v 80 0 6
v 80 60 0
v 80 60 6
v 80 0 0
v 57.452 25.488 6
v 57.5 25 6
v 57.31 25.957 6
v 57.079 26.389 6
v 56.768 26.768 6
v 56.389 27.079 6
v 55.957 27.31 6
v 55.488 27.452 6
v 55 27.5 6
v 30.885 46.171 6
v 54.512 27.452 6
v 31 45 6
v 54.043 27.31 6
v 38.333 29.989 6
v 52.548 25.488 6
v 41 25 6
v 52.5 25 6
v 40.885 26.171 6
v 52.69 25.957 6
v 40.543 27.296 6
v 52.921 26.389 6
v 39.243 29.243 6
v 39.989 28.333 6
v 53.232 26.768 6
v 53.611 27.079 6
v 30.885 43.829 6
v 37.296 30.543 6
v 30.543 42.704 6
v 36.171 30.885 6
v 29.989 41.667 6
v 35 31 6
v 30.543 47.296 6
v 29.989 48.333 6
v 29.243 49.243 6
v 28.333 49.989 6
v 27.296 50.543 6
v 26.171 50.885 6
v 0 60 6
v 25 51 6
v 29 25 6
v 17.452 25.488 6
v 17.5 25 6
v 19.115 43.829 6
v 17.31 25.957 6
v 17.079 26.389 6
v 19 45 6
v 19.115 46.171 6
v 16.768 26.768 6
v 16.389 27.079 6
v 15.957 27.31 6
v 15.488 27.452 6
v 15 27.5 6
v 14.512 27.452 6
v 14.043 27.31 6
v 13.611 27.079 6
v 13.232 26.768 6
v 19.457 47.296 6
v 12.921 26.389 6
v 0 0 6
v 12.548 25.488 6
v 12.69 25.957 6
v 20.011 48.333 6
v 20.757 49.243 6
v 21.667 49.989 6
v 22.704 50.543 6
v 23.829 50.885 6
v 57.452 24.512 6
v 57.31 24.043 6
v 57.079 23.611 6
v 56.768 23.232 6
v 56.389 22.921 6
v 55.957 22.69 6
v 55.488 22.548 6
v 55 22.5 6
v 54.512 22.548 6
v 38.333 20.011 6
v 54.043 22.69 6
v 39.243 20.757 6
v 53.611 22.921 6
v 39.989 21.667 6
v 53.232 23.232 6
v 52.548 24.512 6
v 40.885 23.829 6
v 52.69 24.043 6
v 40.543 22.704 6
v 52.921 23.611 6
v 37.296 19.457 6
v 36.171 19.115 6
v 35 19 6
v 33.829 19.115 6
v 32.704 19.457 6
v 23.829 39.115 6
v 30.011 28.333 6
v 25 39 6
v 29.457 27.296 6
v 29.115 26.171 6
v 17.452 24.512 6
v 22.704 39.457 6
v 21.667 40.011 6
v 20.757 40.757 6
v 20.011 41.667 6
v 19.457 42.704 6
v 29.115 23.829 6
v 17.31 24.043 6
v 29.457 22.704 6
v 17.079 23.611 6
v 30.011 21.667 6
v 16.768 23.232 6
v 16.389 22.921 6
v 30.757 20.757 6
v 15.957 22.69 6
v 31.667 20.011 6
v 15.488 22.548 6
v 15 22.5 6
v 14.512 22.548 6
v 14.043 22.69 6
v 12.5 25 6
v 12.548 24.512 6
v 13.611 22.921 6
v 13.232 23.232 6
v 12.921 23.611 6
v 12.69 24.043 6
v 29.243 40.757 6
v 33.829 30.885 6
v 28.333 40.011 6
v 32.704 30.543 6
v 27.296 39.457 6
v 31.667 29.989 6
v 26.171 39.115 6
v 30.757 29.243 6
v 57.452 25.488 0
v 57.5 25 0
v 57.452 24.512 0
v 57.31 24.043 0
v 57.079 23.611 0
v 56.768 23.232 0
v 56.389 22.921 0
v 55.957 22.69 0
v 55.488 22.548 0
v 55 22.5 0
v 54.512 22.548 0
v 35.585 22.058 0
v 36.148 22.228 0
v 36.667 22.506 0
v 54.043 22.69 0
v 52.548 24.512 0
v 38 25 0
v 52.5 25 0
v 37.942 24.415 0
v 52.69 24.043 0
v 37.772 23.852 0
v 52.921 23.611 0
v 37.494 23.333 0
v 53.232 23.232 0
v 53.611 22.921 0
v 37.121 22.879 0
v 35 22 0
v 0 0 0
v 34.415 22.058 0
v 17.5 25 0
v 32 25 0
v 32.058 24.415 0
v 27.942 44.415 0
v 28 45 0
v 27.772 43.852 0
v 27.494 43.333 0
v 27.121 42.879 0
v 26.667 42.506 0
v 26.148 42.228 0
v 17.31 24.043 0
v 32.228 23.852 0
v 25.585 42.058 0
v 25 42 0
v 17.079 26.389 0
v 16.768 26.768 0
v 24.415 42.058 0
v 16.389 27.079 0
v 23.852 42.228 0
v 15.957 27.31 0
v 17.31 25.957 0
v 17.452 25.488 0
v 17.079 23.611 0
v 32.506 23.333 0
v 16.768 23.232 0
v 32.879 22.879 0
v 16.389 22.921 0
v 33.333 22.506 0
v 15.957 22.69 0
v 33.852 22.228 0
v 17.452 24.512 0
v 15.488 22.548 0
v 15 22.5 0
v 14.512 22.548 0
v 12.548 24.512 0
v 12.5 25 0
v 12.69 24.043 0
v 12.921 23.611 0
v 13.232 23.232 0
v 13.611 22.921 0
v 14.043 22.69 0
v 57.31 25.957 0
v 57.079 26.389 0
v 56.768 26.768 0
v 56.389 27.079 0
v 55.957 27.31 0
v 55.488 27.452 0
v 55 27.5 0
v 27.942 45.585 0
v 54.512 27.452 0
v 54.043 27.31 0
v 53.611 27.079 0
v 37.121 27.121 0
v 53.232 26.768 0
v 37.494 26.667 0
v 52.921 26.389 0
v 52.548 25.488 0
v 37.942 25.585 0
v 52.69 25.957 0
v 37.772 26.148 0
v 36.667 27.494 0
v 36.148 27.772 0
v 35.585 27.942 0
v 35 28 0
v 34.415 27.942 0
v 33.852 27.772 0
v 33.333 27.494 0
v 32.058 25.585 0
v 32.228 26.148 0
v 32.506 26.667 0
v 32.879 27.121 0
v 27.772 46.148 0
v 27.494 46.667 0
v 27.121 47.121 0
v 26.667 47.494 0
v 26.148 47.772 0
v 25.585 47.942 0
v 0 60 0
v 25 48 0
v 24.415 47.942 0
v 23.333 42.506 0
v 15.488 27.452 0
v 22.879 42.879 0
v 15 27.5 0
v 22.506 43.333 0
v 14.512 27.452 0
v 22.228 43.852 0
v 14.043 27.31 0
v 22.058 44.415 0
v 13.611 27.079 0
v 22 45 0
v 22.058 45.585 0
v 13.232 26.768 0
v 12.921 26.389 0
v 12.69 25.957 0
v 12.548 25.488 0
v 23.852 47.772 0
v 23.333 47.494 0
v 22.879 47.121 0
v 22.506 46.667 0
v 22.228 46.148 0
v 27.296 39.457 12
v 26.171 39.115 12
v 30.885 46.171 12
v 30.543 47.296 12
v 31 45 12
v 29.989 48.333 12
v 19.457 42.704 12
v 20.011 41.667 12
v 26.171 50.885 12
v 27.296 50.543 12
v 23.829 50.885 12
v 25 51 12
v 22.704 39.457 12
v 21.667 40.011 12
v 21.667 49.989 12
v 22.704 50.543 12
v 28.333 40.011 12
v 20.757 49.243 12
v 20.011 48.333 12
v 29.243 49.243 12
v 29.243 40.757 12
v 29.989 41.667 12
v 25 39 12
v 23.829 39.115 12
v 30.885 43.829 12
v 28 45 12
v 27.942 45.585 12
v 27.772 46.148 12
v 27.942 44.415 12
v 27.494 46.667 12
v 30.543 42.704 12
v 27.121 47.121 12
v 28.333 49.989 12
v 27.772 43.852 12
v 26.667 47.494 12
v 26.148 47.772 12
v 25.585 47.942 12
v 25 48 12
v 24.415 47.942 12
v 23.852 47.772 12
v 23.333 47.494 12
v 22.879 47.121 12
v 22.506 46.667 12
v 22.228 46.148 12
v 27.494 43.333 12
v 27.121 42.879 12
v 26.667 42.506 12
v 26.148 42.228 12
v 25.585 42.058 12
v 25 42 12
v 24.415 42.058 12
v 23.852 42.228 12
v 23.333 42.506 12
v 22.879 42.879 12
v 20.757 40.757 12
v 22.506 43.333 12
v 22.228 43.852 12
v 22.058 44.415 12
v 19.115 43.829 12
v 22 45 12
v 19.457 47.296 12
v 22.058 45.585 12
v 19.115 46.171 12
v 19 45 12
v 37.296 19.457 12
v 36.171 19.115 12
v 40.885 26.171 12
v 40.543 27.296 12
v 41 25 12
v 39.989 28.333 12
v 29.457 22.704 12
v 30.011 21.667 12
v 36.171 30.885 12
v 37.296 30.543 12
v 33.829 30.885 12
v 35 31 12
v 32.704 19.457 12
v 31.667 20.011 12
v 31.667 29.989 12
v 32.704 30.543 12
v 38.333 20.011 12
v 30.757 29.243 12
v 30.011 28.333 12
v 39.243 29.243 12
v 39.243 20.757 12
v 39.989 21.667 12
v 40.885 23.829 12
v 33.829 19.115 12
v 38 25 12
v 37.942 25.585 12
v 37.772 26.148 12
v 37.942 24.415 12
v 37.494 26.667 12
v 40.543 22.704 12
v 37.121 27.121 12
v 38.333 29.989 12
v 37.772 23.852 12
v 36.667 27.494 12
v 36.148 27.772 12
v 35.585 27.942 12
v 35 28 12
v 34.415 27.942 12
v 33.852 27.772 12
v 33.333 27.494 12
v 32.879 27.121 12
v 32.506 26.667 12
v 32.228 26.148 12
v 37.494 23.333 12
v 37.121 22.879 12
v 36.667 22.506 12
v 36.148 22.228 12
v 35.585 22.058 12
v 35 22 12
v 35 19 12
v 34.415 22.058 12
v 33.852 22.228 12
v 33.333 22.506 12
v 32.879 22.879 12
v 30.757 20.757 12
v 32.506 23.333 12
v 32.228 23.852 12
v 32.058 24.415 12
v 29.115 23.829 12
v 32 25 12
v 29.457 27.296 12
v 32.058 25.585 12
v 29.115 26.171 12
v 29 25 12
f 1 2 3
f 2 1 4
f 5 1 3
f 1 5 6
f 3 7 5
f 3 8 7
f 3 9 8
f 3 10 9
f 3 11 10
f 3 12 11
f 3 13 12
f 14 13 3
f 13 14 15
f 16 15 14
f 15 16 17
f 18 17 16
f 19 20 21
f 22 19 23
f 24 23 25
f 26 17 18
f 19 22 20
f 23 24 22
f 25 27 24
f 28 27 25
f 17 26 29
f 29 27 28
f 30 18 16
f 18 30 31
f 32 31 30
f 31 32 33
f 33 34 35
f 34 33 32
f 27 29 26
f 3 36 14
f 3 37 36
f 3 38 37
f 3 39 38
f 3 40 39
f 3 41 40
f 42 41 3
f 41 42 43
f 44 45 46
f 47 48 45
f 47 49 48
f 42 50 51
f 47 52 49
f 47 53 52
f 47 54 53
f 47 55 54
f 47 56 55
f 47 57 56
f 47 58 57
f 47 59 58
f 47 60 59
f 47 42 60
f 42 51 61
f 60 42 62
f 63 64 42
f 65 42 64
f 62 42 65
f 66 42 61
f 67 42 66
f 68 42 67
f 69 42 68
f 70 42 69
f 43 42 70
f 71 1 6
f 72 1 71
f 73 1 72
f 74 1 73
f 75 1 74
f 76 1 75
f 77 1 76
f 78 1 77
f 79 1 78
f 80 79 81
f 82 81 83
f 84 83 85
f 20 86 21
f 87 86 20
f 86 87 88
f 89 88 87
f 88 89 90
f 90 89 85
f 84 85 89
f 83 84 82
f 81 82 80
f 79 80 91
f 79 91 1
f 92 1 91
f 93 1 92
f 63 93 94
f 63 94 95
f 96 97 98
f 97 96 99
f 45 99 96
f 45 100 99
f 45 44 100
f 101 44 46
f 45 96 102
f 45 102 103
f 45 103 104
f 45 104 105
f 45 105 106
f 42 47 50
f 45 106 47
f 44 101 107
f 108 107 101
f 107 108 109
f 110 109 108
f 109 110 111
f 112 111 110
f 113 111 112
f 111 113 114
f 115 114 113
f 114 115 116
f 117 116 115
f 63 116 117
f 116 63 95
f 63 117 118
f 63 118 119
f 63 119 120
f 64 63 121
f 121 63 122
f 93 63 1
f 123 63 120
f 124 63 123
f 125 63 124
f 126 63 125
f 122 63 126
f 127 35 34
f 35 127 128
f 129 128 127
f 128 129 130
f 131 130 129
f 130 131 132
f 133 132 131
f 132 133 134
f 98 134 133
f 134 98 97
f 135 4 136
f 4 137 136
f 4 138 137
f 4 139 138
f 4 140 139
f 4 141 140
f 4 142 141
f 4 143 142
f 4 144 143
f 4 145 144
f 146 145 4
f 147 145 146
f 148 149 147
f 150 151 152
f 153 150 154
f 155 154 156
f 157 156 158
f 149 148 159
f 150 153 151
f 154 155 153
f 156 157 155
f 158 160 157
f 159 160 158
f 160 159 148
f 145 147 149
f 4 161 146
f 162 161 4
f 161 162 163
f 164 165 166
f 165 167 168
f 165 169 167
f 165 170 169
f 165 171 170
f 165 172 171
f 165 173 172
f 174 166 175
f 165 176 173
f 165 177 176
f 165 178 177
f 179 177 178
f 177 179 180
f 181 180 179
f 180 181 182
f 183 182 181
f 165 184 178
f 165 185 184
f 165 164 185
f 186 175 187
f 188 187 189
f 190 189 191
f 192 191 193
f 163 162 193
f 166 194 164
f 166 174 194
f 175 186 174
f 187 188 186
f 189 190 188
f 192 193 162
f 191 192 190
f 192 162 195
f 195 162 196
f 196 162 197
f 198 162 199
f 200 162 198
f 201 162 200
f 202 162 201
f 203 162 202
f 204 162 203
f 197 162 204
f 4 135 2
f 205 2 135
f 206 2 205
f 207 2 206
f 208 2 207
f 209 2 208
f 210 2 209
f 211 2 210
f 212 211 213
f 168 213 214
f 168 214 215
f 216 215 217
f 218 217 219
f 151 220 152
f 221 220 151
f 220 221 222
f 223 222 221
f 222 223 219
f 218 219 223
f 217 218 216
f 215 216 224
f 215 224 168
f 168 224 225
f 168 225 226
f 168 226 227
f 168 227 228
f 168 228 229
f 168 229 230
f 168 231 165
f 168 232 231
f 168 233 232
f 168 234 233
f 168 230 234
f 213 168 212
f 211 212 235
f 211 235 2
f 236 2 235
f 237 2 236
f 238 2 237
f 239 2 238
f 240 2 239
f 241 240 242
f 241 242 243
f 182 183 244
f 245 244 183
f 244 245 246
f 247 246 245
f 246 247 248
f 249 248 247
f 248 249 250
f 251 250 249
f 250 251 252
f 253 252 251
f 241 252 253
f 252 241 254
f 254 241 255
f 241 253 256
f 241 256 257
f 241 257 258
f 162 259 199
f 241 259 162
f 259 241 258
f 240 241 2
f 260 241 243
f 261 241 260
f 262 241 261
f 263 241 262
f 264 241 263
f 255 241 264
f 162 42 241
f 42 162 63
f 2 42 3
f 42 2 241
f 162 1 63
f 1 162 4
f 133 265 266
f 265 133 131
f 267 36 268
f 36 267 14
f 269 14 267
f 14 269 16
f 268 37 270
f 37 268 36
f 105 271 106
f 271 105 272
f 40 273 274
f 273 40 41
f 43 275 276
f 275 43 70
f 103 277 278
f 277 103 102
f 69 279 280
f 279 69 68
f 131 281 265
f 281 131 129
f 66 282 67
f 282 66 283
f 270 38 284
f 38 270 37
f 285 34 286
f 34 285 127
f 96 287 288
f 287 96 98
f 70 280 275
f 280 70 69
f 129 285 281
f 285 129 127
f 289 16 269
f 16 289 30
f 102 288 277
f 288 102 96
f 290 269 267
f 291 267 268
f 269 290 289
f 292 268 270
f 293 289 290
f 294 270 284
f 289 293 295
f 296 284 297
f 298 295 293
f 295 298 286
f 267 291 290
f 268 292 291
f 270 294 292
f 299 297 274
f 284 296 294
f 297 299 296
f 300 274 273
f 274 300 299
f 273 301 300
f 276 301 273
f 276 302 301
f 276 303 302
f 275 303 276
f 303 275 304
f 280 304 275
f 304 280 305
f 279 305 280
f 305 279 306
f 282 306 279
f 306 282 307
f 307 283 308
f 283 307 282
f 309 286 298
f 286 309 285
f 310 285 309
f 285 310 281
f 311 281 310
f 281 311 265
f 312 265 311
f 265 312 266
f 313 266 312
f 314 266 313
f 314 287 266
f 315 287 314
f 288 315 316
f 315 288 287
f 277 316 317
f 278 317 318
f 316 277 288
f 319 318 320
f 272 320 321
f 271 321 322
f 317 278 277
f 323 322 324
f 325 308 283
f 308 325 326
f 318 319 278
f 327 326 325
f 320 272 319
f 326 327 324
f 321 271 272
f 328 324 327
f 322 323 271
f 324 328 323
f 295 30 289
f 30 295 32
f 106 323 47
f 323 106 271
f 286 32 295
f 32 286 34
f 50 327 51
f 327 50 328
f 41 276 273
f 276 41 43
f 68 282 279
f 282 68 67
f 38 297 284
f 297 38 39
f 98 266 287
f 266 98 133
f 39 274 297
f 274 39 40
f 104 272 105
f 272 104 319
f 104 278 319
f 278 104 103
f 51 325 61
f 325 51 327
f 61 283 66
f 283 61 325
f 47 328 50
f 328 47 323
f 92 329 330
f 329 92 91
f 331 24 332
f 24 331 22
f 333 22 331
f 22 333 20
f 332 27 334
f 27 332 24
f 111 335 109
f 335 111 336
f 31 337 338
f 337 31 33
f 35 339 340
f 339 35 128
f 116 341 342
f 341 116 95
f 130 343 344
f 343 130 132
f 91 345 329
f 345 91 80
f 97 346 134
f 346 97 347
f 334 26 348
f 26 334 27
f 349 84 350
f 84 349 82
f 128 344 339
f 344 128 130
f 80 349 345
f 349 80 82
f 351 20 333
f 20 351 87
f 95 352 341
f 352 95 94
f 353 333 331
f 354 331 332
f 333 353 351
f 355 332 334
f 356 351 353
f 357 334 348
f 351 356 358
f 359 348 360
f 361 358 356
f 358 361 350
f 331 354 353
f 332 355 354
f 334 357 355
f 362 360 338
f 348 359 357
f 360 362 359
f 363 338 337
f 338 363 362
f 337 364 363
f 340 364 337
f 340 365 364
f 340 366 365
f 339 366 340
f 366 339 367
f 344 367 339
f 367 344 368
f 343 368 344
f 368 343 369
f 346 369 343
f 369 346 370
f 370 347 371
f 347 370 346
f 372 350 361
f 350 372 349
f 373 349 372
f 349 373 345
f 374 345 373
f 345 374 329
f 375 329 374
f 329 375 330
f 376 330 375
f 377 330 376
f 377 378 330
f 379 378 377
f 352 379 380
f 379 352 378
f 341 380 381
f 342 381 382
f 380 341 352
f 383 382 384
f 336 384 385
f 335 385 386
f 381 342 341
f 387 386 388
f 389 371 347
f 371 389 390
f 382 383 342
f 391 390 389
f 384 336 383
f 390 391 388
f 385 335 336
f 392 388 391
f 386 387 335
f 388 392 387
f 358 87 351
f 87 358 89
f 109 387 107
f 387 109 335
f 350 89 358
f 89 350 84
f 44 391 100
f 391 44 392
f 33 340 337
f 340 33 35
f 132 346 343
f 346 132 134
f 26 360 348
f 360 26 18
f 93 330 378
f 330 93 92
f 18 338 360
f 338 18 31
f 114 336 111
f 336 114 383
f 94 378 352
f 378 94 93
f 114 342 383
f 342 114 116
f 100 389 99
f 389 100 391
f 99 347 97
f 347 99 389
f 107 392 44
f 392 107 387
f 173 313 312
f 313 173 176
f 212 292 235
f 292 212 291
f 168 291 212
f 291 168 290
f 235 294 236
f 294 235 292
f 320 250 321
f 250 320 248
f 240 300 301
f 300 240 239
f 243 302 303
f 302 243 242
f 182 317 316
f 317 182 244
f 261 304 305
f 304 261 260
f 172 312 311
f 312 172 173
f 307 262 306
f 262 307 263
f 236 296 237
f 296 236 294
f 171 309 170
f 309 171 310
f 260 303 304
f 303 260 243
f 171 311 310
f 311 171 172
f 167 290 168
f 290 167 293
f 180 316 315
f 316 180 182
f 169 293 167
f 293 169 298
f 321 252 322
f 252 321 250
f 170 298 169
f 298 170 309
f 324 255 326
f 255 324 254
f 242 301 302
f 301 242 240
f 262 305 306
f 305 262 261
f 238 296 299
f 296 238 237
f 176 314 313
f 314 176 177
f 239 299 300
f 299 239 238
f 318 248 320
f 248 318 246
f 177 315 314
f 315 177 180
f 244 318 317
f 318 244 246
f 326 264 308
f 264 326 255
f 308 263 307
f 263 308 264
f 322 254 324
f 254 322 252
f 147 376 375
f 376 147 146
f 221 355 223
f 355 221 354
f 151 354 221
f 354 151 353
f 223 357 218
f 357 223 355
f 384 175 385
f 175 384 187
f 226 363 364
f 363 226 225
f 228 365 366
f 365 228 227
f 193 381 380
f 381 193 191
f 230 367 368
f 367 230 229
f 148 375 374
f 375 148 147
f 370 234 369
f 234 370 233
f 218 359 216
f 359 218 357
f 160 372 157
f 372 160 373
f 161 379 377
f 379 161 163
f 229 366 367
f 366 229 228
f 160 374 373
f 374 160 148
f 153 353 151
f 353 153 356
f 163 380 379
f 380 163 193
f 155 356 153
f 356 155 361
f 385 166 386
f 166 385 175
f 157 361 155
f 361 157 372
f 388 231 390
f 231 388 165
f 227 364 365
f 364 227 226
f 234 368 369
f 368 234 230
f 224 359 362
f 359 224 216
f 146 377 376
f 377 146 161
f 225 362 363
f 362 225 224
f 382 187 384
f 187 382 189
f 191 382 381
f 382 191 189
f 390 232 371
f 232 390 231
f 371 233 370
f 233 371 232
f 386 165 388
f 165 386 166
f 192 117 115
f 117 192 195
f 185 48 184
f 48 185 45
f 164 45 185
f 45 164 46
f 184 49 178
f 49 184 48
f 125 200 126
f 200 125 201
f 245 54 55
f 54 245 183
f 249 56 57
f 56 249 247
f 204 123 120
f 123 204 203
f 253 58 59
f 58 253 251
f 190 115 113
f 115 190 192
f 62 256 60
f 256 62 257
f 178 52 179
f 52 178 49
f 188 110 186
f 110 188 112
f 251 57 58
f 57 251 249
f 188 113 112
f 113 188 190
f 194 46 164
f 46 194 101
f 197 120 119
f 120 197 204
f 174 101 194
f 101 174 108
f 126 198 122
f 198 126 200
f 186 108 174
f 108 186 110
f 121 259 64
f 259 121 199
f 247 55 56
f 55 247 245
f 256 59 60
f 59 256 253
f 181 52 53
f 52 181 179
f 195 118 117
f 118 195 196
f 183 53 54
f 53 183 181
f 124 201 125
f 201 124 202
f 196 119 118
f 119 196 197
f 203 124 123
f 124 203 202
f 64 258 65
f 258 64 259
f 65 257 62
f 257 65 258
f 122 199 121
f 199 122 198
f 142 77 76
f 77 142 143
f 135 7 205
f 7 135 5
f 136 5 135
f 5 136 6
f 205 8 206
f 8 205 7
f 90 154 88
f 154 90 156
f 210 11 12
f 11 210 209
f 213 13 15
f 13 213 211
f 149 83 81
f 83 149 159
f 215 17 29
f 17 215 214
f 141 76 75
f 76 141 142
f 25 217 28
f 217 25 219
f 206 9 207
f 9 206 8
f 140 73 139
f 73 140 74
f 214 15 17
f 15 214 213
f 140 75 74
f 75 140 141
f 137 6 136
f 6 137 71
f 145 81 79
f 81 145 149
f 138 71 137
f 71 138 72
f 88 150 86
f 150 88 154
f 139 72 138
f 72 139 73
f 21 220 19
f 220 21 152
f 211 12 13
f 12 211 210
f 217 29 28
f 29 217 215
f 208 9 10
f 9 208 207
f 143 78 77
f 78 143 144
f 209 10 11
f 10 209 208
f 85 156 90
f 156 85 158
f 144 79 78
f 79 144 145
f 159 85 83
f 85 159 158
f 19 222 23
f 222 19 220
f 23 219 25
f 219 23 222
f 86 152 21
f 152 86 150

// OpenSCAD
$fn = 32;

// ----------------------------------------------------------------------
// Mixed field: bosses and holes at given coordinates
// ----------------------------------------------------------------------

// --- parameters (mm) ---
plate_l = 80;             // plate length, X
plate_w = 60;             // plate width, Y
plate_t = 6;              // plate thickness, Z
boss_d = 12;              // boss diameter
boss_h = 6;               // boss height above the plate
hole_d = 5;               // through hole diameter

total_h = plate_t + boss_h;  // overall height

difference() {
  union() {
    cube([plate_l, plate_w, plate_t]);
    translate([25, 45, plate_t]) cylinder(h = boss_h, d = boss_d);
    translate([35, 25, plate_t]) cylinder(h = boss_h, d = boss_d);
  }
  translate([25, 45, -1]) cylinder(h = total_h + 2, d = boss_d / 2);
  translate([35, 25, -1]) cylinder(h = total_h + 2, d = boss_d / 2);
  translate([15, 25, -1]) cylinder(h = plate_t + 2, d = hole_d);
  translate([55, 25, -1]) cylinder(h = plate_t + 2, d = hole_d);
}
